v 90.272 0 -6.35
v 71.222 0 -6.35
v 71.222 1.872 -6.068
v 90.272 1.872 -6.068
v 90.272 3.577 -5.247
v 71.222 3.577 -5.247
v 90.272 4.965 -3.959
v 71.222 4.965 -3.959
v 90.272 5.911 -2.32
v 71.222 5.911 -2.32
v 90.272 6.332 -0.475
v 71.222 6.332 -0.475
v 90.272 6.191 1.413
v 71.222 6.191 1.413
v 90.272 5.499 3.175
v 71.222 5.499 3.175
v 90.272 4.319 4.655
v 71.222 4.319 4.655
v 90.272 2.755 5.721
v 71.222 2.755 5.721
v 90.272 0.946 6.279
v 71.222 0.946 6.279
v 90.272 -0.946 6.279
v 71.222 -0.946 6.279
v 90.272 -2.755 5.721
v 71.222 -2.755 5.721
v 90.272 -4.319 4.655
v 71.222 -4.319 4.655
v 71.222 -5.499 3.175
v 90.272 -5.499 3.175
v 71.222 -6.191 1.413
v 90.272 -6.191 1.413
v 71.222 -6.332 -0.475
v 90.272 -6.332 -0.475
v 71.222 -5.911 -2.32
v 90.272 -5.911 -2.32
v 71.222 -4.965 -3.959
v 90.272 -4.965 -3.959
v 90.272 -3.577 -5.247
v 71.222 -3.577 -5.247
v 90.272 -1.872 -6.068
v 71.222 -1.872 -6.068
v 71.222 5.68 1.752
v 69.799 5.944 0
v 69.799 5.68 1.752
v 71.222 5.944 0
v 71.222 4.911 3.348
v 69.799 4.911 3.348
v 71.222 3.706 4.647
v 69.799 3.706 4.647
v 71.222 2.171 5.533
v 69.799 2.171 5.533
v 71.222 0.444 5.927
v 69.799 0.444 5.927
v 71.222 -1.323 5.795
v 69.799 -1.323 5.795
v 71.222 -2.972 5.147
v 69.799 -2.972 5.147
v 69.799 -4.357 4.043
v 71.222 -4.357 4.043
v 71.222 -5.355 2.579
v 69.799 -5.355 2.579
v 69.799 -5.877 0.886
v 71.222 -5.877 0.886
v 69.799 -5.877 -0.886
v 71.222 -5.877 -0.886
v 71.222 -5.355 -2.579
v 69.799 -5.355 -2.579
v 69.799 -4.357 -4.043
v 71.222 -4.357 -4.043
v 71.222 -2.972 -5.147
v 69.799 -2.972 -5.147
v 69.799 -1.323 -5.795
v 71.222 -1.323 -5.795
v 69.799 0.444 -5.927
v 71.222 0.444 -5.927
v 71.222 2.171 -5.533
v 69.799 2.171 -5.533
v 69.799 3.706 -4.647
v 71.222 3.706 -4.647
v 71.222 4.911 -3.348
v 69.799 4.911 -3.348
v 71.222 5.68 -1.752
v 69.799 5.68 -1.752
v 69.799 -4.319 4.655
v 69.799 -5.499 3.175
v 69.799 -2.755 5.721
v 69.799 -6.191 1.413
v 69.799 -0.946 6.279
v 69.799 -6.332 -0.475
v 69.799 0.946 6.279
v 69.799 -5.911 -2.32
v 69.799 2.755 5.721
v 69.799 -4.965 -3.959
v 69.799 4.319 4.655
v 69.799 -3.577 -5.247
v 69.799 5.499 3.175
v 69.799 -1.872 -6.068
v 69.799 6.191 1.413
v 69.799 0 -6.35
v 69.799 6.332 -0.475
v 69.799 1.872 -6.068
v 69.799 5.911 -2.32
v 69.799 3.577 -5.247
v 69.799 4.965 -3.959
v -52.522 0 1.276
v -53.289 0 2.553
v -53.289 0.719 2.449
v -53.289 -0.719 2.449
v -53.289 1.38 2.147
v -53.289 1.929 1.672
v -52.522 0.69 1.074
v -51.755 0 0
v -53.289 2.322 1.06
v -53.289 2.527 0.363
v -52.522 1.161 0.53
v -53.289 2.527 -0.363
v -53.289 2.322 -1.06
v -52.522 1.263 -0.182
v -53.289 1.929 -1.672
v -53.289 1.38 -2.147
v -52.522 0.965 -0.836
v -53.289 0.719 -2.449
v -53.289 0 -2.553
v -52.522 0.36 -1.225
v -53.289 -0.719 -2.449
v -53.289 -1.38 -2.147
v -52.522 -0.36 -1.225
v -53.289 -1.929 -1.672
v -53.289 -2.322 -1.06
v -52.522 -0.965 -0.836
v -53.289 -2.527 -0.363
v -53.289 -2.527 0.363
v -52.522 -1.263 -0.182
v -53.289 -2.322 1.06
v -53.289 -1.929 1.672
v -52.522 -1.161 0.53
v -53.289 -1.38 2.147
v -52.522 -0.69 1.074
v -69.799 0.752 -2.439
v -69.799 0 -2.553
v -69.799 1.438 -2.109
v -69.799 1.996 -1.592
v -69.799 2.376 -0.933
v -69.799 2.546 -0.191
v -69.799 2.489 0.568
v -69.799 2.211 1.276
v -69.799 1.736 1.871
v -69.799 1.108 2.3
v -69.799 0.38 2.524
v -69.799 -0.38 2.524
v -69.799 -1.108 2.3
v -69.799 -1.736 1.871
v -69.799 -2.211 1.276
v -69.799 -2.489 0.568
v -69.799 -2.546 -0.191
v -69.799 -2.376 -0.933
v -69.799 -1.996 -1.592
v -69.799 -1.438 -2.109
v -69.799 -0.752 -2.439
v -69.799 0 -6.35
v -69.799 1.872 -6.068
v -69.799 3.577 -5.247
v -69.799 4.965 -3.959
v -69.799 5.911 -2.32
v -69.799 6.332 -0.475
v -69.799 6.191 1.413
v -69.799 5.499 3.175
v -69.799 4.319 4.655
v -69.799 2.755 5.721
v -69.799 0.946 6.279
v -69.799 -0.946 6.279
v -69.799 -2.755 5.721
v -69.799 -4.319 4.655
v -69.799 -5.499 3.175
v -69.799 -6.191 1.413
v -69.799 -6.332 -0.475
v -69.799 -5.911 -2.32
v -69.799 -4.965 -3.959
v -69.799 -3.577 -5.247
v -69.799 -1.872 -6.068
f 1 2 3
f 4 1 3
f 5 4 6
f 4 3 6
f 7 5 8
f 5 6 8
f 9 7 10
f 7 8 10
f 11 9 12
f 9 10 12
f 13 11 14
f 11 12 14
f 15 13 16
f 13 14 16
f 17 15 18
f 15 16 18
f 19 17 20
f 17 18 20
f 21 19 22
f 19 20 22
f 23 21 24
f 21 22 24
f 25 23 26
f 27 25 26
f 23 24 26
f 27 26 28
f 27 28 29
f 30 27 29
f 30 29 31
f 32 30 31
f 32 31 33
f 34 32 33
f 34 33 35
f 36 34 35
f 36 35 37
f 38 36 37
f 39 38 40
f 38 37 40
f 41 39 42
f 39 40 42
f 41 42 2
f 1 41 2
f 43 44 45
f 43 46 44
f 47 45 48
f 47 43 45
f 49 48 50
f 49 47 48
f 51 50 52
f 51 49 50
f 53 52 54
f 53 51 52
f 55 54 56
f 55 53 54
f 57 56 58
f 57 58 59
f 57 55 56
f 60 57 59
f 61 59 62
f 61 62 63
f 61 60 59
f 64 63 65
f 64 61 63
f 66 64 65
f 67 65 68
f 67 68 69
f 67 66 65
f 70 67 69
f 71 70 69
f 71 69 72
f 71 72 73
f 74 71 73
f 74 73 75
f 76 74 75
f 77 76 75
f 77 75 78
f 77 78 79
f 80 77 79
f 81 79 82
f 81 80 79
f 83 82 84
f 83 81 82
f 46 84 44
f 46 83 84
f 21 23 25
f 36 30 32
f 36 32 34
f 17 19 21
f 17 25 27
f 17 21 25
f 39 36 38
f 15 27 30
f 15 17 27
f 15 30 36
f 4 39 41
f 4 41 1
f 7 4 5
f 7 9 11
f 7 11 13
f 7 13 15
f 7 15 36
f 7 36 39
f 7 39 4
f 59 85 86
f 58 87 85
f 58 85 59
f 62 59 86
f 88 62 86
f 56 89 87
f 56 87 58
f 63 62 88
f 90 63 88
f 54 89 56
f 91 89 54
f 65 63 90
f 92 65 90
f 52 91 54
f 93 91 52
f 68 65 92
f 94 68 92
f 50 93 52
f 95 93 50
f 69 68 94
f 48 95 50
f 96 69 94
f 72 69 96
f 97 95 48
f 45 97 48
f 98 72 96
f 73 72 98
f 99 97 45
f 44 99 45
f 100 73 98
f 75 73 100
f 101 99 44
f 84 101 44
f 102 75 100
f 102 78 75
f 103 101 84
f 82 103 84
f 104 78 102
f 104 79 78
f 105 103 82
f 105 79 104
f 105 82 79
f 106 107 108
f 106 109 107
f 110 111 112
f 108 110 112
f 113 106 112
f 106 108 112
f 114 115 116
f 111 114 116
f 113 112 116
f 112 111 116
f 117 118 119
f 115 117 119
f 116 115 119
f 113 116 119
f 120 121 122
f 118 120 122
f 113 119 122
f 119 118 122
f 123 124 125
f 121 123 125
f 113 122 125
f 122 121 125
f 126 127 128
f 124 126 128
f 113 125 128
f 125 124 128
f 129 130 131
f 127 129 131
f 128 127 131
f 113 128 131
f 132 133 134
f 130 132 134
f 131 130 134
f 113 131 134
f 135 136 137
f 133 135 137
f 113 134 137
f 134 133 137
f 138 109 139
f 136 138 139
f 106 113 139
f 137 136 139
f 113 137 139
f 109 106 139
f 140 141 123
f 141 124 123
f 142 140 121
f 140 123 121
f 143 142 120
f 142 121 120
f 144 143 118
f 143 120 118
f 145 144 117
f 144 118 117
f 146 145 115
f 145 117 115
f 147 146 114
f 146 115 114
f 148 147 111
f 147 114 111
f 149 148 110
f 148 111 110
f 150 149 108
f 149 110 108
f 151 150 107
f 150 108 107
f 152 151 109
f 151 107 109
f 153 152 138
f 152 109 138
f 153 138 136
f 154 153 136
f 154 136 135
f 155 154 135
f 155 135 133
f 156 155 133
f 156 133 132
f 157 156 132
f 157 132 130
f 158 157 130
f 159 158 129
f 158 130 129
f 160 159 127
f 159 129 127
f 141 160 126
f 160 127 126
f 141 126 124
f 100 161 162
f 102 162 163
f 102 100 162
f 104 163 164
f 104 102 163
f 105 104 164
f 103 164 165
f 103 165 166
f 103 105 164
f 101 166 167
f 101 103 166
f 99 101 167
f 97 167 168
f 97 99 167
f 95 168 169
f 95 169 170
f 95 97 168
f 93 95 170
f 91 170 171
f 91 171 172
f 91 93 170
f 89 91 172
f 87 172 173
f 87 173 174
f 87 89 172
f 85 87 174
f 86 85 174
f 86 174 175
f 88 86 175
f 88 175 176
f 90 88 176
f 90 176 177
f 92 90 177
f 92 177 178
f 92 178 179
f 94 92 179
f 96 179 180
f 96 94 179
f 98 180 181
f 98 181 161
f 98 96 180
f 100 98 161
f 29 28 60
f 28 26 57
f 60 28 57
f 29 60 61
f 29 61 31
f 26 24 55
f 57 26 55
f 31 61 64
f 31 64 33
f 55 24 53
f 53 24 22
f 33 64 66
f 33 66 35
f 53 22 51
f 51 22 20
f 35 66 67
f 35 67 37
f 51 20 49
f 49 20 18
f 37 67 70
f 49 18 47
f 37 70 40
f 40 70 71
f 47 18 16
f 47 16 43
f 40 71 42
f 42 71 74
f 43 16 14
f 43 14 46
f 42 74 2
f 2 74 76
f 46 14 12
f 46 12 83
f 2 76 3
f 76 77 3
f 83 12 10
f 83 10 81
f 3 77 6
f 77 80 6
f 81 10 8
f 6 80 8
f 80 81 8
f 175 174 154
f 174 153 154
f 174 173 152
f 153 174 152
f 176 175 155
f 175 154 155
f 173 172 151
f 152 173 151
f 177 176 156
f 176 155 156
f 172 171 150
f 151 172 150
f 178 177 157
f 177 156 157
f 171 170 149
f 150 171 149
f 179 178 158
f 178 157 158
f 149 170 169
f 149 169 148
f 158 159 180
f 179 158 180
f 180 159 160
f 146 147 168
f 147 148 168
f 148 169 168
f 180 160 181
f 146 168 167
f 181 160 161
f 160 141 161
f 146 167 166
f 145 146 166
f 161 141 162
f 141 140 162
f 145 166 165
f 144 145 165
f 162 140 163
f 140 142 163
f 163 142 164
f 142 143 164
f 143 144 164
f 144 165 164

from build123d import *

# Parameters (mm, degrees)
SKETCH1_R                   = 6.35
BOSS_EXTRUDE1_DEPTH         = 69.7992
SKETCH2_W                   = 1.4224
SKETCH2_H                   = 5.9436
SKETCH3_R                   = 6.35
BOSS_EXTRUDE2_DEPTH         = 19.05
F_1_4_20_TAPPED_HOLE1_D     = 5.1054
F_1_4_20_TAPPED_HOLE1_DEPTH = 16.51
F_1_4_20_TAPPED_HOLE1_TIP   = 1.533816902


with BuildPart() as part:
    # Sketch1 → Boss-Extrude1 (new body, symmetric)
    with BuildSketch(Plane(origin=(0, 0, 0), x_dir=(0, 0, -1), z_dir=(1, 0, 0))):
        Circle(SKETCH1_R)
    extrude(amount=BOSS_EXTRUDE1_DEPTH, both=True)

    # Sketch2 → Revolve2 (revolve)
    with BuildSketch(Plane.XY):
        with Locations((70.5104, 2.9718)):
            Rectangle(SKETCH2_W, SKETCH2_H)
    revolve(axis=Axis((0, 0, 0), (1, 0, 0)))

    # Sketch3 → Boss-Extrude2 (add)
    with BuildSketch(Plane(origin=(71.2216, 0, 0), x_dir=(0, 0, -1), z_dir=(1, 0, 0))):
        Circle(SKETCH3_R)
    extrude(amount=BOSS_EXTRUDE2_DEPTH)

    # 1/4-20 Tapped Hole1
    with Locations(Plane.ZY.offset(69.7992)):
        with Locations((0, 0)):
            Hole(F_1_4_20_TAPPED_HOLE1_D / 2, depth=F_1_4_20_TAPPED_HOLE1_DEPTH)
            with Locations((0, 0, -(F_1_4_20_TAPPED_HOLE1_DEPTH + F_1_4_20_TAPPED_HOLE1_TIP / 2))):  # 118° drill point
                Cone(0, F_1_4_20_TAPPED_HOLE1_D / 2, F_1_4_20_TAPPED_HOLE1_TIP, mode=Mode.SUBTRACT)


solid = part.part
